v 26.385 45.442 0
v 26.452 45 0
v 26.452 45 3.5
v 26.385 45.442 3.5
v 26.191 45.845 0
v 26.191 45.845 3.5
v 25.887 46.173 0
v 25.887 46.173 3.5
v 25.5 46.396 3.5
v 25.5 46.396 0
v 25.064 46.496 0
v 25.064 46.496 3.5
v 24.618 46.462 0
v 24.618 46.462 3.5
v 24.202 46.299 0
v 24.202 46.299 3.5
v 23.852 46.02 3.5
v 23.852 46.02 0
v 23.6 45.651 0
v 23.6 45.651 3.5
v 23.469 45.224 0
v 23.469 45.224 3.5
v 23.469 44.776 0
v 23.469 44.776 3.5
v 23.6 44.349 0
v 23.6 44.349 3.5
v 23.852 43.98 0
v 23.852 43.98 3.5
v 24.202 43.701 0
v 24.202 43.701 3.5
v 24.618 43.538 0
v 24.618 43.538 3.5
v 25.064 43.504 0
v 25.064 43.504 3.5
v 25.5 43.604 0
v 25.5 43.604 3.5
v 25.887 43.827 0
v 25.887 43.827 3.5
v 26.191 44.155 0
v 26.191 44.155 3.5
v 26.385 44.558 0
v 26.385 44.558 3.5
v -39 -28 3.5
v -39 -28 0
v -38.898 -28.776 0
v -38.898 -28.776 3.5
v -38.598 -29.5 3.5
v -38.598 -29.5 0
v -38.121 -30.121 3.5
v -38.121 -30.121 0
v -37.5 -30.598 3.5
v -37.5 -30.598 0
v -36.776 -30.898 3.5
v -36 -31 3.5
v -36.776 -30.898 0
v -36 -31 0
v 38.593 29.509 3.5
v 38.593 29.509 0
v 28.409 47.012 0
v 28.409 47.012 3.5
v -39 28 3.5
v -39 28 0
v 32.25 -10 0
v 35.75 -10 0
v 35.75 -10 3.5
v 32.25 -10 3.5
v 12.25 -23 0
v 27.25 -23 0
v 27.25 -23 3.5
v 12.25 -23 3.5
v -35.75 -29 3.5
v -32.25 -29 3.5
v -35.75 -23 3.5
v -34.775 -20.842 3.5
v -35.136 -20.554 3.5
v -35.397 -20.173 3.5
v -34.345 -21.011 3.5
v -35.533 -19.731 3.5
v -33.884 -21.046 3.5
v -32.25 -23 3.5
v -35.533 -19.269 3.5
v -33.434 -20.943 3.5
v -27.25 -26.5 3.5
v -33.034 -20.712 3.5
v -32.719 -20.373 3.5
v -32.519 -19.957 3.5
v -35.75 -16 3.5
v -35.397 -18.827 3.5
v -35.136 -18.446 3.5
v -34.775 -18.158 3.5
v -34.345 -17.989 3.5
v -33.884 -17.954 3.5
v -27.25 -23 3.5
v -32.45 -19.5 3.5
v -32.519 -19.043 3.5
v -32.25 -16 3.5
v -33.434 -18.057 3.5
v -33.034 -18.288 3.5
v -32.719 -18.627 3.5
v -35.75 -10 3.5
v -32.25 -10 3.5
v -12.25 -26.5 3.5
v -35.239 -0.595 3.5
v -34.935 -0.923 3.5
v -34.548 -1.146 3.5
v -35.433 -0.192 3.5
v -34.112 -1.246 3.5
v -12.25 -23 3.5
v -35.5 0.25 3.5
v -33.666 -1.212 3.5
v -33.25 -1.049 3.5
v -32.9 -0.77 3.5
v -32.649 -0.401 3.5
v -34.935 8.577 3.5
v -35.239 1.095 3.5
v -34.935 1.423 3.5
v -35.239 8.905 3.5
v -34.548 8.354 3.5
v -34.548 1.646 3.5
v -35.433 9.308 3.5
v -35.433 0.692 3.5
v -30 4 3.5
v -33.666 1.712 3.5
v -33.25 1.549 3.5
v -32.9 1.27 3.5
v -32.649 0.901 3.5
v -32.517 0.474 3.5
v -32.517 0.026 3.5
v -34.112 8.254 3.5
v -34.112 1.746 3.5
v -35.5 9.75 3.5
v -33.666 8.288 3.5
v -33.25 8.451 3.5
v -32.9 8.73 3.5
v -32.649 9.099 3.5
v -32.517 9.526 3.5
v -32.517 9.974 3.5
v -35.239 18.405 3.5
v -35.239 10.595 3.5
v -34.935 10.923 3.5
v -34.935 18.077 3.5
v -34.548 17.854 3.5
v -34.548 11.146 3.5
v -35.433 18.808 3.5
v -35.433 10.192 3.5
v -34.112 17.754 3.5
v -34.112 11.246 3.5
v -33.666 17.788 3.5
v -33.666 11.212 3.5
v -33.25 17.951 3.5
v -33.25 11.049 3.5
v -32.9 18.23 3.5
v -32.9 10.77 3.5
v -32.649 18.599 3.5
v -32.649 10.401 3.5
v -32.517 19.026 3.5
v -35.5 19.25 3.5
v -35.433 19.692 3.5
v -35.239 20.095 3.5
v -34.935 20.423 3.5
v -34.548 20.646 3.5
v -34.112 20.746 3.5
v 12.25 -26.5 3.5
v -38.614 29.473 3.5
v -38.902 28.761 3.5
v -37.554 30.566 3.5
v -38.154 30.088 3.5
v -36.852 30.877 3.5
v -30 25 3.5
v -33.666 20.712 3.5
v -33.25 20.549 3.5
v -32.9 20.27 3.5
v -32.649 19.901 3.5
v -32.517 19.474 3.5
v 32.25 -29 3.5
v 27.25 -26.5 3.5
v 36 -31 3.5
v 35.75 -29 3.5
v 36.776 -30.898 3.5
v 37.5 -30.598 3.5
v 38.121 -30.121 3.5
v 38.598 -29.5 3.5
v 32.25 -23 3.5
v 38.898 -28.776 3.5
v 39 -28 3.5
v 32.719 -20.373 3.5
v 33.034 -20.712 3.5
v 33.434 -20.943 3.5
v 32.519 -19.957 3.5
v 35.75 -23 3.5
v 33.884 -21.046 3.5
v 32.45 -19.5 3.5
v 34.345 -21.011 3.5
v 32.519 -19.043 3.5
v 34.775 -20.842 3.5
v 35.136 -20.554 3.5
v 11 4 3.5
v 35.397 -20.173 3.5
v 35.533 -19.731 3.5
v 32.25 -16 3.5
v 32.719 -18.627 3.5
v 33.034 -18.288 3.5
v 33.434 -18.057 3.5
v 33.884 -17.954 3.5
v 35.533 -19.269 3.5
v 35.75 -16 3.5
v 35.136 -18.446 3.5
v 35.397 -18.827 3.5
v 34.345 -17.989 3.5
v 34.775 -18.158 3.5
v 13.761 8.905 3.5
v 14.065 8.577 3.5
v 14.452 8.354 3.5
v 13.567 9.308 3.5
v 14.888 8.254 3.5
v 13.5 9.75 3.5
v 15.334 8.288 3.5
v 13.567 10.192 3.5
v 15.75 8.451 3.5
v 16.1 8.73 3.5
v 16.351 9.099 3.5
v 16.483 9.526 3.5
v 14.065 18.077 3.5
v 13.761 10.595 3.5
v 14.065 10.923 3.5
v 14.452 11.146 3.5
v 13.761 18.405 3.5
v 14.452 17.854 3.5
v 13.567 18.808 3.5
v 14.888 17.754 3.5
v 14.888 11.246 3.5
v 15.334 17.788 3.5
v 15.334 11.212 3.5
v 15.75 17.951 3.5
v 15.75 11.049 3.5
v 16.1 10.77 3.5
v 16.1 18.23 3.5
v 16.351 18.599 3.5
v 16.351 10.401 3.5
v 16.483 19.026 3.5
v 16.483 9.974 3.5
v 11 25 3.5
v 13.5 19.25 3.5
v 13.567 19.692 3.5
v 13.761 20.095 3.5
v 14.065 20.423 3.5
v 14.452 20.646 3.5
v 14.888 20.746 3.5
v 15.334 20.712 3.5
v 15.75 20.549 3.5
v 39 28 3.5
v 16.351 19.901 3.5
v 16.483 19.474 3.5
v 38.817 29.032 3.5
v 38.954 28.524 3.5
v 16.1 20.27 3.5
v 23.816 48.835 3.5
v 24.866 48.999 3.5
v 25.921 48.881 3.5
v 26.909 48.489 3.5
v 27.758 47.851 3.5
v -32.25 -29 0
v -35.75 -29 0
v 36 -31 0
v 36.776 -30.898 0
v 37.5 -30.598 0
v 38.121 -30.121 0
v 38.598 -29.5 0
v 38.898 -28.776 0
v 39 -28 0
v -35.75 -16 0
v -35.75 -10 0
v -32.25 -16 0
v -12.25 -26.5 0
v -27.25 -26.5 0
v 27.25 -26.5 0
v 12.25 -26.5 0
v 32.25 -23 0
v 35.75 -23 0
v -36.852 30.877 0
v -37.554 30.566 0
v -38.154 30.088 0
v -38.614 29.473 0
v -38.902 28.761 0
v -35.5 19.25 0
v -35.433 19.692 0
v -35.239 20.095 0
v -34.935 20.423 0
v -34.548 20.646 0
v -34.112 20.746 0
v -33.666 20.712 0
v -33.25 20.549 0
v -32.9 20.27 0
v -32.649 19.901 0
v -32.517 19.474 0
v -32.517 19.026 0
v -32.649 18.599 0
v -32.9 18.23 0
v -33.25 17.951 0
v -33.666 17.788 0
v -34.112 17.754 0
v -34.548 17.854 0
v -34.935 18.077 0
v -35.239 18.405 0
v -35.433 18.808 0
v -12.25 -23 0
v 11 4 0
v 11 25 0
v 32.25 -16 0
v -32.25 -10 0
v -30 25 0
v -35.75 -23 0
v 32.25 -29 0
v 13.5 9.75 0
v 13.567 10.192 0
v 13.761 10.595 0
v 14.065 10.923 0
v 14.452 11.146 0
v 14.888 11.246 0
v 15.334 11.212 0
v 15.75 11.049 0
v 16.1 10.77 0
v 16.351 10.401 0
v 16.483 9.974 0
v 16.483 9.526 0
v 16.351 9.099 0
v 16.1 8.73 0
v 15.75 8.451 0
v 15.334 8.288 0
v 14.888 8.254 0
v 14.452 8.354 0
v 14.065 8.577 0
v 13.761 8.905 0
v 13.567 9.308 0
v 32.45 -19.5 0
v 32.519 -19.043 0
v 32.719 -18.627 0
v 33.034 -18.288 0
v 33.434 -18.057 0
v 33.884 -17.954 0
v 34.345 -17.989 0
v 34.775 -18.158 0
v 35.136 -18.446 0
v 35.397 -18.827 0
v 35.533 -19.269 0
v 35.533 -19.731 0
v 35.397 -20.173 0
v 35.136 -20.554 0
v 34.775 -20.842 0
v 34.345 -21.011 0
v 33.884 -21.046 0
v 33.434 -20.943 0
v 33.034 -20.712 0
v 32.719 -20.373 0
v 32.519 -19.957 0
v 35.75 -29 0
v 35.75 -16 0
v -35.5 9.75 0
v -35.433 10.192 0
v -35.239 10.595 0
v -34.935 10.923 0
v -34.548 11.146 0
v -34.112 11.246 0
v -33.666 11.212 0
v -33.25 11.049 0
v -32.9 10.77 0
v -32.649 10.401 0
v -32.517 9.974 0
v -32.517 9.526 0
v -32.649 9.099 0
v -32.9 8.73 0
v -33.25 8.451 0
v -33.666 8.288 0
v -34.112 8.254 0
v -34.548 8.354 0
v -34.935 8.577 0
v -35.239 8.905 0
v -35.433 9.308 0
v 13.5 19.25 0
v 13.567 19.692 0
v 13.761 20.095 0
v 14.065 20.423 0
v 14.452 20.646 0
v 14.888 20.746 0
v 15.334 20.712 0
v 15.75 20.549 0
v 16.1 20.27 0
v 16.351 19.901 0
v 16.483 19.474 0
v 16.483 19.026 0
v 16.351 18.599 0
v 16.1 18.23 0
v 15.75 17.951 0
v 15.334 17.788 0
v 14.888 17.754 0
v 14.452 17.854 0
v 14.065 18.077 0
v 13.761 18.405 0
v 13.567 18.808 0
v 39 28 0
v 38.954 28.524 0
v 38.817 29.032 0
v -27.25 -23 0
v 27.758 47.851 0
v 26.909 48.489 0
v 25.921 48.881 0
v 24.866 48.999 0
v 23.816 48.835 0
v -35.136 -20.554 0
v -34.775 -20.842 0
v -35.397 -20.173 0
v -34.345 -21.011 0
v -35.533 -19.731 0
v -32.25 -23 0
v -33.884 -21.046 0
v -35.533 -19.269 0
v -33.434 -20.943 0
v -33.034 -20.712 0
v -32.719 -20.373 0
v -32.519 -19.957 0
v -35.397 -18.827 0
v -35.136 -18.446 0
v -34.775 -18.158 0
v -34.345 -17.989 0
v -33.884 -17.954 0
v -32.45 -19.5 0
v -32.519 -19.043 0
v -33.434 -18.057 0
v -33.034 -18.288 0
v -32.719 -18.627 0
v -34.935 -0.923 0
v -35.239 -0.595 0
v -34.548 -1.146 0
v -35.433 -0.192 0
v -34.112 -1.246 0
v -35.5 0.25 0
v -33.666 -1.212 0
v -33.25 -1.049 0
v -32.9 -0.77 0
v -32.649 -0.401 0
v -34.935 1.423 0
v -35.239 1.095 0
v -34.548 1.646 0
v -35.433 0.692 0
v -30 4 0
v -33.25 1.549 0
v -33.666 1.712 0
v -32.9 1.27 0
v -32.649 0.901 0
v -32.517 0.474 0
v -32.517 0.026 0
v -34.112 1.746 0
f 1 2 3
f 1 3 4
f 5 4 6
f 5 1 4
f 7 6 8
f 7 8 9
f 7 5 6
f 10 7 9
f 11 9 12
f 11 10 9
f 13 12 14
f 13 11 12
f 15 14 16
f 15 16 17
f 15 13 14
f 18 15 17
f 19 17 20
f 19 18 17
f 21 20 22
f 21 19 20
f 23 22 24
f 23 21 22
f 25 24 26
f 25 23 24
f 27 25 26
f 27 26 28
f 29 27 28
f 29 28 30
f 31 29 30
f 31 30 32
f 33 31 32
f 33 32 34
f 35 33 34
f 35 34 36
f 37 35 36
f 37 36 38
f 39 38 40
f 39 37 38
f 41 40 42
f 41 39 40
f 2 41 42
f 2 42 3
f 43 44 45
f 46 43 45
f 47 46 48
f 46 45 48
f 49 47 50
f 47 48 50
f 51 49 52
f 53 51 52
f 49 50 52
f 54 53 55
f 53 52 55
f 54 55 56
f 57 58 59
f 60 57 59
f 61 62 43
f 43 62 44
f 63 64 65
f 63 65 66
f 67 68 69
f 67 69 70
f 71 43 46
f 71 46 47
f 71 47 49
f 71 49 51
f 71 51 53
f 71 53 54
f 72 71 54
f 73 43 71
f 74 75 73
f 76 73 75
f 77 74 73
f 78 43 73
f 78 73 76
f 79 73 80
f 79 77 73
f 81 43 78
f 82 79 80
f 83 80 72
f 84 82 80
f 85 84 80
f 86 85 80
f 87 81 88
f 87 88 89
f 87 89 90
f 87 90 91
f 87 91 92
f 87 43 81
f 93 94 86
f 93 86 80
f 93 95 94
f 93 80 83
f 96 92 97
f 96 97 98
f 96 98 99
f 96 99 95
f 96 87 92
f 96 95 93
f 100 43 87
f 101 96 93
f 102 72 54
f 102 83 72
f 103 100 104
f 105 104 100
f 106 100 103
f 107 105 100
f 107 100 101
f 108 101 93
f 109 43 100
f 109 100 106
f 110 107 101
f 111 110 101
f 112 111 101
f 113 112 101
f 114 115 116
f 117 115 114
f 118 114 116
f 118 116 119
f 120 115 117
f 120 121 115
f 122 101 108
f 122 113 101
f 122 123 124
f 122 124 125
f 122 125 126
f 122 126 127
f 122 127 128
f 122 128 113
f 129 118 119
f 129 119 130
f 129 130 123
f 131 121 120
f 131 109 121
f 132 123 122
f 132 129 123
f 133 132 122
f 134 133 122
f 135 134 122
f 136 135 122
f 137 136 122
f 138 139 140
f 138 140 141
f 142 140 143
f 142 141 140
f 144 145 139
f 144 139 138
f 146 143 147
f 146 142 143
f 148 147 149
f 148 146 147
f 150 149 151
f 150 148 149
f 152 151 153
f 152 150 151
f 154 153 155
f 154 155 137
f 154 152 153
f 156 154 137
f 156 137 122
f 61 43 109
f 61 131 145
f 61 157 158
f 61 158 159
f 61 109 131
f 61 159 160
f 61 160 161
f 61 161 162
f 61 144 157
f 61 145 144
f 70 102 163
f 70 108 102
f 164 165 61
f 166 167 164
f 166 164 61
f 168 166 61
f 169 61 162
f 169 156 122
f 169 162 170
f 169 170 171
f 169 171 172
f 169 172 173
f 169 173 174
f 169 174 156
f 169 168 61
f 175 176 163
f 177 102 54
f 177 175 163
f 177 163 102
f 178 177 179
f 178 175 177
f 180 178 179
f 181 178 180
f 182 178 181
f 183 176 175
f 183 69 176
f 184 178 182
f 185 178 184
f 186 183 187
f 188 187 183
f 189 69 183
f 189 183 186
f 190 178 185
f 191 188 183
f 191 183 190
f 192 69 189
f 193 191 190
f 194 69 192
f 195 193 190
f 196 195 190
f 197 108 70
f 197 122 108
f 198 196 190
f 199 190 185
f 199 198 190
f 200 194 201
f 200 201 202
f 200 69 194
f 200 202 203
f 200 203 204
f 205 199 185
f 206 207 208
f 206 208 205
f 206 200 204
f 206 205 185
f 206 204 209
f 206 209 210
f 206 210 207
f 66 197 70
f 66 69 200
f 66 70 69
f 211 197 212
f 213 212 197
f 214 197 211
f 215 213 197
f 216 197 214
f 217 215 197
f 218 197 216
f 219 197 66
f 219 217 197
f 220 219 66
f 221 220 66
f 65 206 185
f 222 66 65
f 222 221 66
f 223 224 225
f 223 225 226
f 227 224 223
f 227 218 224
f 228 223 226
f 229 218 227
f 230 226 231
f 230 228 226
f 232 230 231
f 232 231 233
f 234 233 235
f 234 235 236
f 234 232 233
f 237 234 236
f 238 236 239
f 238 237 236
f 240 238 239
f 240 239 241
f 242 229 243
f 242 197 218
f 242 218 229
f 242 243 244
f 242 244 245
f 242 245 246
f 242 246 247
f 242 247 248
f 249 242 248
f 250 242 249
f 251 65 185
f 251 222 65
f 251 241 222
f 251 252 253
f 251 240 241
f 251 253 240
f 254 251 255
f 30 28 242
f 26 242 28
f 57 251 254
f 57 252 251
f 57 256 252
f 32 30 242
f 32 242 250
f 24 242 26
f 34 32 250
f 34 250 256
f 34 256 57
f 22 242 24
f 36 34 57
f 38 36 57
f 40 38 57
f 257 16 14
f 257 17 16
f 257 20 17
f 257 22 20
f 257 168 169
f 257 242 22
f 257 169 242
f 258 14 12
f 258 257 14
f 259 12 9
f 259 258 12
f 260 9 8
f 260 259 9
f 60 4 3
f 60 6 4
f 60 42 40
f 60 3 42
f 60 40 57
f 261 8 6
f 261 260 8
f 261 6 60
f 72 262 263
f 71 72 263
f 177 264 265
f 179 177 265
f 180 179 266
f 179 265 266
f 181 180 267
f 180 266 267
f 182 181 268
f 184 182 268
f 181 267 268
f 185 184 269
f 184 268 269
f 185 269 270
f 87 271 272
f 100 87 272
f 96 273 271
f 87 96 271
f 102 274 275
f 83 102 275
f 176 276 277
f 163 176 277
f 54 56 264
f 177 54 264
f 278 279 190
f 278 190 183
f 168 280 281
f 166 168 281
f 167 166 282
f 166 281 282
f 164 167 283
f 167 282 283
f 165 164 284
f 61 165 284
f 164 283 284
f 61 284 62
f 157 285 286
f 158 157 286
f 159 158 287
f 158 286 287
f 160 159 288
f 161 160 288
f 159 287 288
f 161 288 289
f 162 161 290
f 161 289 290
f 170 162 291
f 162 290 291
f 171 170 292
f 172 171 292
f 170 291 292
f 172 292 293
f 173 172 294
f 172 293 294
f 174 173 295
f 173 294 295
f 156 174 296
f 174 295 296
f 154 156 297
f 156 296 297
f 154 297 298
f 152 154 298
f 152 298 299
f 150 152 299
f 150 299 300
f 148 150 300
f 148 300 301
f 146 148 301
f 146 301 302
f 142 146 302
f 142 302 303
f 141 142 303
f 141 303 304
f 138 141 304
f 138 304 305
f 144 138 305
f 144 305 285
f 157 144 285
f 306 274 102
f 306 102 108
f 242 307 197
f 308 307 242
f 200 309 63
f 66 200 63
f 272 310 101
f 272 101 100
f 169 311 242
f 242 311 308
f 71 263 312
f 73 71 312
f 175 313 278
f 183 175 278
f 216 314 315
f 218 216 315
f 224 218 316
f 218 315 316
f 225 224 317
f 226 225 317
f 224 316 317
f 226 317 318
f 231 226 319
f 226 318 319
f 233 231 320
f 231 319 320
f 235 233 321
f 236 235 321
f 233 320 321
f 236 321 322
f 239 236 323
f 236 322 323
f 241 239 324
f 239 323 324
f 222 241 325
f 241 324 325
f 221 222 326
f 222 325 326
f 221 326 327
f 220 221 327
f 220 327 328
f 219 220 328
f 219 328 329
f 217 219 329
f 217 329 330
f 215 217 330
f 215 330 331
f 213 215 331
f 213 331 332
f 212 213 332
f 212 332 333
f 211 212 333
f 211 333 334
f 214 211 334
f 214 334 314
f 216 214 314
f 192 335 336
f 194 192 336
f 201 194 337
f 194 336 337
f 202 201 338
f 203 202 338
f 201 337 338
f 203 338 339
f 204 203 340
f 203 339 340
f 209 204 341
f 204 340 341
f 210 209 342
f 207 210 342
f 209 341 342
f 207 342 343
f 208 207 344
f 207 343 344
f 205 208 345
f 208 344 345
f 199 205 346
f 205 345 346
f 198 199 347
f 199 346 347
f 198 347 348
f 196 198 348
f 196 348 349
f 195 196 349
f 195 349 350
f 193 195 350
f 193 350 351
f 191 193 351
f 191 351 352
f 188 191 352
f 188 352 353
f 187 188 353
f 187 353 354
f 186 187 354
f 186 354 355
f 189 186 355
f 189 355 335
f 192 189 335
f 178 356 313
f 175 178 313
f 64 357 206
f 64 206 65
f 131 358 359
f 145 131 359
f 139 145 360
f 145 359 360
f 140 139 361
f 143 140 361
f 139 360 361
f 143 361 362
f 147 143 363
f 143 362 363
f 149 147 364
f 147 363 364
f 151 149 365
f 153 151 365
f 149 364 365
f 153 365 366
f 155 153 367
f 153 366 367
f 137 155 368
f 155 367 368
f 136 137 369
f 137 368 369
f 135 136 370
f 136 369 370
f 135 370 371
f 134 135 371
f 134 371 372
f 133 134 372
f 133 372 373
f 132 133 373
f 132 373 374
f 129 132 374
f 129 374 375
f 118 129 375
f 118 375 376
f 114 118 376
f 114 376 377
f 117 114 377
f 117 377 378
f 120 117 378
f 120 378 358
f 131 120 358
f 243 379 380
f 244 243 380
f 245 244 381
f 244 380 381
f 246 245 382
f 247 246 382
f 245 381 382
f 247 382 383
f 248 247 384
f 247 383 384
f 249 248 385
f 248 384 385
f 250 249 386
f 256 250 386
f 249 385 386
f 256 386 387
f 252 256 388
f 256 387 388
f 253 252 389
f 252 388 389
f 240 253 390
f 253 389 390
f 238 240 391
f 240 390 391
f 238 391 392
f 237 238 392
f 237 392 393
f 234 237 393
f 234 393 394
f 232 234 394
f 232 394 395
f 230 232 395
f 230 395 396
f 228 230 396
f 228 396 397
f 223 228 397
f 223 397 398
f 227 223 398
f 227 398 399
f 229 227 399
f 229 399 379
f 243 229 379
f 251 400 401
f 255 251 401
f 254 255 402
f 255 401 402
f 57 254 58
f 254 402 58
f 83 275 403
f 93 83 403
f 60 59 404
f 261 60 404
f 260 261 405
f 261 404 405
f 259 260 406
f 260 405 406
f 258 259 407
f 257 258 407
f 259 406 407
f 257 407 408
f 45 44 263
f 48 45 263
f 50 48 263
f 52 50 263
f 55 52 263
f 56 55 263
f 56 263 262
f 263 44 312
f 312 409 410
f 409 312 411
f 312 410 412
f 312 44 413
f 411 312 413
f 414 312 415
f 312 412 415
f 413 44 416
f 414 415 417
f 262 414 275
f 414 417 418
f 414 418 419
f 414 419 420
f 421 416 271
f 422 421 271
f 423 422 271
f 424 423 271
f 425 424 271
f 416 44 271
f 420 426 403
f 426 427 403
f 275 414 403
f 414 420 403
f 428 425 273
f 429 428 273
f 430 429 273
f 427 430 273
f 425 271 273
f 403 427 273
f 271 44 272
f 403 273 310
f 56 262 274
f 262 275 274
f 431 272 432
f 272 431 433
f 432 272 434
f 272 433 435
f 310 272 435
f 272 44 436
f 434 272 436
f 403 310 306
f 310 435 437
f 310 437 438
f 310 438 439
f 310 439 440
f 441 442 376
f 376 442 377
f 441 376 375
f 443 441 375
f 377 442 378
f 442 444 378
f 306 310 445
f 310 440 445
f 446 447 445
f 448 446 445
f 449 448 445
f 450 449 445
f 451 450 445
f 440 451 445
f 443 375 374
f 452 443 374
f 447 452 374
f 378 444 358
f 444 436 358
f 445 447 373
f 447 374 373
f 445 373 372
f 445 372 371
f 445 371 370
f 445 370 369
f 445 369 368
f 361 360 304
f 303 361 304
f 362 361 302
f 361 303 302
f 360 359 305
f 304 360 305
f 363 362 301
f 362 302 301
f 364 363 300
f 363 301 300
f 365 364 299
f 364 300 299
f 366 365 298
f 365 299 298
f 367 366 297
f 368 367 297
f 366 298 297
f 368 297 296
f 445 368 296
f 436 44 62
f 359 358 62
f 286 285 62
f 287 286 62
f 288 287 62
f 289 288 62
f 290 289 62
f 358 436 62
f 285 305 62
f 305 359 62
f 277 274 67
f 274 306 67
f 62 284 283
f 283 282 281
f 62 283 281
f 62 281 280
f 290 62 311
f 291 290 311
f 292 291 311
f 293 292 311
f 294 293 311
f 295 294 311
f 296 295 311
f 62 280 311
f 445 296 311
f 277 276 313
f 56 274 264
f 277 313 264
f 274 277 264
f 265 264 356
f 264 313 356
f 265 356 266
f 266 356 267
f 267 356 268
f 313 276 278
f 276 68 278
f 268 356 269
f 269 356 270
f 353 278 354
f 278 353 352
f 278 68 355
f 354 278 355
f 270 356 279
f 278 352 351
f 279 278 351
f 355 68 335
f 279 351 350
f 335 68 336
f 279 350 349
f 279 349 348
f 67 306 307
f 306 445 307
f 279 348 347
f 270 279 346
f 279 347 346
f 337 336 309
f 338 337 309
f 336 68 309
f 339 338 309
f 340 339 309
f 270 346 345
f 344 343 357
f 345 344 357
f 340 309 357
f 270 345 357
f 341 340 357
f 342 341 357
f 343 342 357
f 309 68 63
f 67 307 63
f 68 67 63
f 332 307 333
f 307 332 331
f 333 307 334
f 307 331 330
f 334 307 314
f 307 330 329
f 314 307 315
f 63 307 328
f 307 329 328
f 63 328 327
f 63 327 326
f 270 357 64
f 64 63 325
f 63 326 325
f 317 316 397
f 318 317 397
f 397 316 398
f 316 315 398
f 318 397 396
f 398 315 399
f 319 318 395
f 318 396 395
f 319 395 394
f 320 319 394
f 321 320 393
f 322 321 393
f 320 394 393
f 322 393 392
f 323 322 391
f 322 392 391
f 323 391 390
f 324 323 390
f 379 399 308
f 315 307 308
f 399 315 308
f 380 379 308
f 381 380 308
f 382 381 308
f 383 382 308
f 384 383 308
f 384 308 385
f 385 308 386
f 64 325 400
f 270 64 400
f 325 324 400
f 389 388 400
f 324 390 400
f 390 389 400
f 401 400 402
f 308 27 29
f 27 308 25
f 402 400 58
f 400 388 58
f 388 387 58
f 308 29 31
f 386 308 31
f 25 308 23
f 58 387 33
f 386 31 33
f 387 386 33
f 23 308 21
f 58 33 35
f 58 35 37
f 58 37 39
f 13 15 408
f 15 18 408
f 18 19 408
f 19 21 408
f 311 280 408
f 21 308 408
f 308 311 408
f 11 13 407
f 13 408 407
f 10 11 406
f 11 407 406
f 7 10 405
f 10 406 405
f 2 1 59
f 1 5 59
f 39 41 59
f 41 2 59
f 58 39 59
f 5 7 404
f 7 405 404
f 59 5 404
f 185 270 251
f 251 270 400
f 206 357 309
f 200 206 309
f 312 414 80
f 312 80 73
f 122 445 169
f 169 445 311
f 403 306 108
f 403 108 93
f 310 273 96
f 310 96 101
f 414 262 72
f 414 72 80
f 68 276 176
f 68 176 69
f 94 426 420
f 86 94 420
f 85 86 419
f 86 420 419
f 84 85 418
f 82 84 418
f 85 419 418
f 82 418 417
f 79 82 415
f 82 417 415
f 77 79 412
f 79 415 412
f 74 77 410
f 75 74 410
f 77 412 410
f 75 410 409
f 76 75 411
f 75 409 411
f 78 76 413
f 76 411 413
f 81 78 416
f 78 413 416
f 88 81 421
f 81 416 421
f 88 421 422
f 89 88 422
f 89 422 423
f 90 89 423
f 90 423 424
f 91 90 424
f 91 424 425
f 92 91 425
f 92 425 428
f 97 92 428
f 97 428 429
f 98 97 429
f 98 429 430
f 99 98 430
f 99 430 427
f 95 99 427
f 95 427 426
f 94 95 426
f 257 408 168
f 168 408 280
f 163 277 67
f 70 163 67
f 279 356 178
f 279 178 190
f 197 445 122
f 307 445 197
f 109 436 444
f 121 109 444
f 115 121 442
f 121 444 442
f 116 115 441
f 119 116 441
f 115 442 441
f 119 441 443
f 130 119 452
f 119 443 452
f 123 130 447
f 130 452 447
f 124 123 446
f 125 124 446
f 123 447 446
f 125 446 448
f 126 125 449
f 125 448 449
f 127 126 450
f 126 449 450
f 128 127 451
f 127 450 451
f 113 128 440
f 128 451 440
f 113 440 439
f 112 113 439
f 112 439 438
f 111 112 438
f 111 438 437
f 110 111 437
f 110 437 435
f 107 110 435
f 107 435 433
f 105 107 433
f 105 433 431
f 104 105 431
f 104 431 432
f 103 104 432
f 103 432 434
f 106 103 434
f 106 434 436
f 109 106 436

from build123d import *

# Parameters (mm, degrees)
SKETCH1_R           = 1.5
SKETCH1_W           = 41
SKETCH1_H           = 21
BOSS_EXTRUDE1_DEPTH = 3.5
SKETCH2_R           = 1.55
SKETCH2_W           = 3.5
SKETCH2_H           = 6
CUT_EXTRUDE1_DEPTH  = 63.723600024
SKETCH3_W           = 15
SKETCH3_H           = 3.5
CUT_EXTRUDE2_DEPTH  = 63.723600024
SKETCH4_R           = 1.5
CUT_EXTRUDE3_DEPTH  = 63.723600024
CUT_EXTRUDE5_REACH  = 64.724
SKETCH5_R           = 1.5


with BuildPart() as part:
    # Sketch1 → Boss-Extrude1 (new body)
    with BuildSketch(Plane.XY):
        with BuildLine():
            Line((-36, -31), (36, -31))
            ThreePointArc((36, -31), (38.121320344, -30.121320344), (39, -28))
            Line((39, -28), (39, 28))
            ThreePointArc((39, 28), (38.896468429, 28.781326206), (38.593019574, 29.508724458))
            Line((38.593019574, 29.508724458), (28.409114334, 47.011632611))
            ThreePointArc((28.409114334, 47.011632611), (26.428070455, 48.717592284), (23.81637841, 48.835481746))
            Line((23.81637841, 48.835481746), (-36.851532369, 30.876611309))
            ThreePointArc((-36.851532369, 30.876611309), (-38.403601164, 29.795188415), (-39, 28))
            Line((-39, 28), (-39, -28))
            ThreePointArc((-39, -28), (-38.121320344, -30.121320344), (-36, -31))
        make_face()
        with Locations((24.951754903, 45)):
            Circle(SKETCH1_R, mode=Mode.SUBTRACT)
        with Locations((-9.5, 14.5)):
            Rectangle(SKETCH1_W, SKETCH1_H, mode=Mode.SUBTRACT)
    extrude(amount=BOSS_EXTRUDE1_DEPTH)

    # Sketch2 → Cut-Extrude1 (cut, through all)
    with BuildSketch(Plane(origin=(0, 0, 0), x_dir=(-1, 0, 0), z_dir=(0, 0, -1))):
        with Locations((-34, -19.5)):
            Circle(SKETCH2_R)
        with Locations(Location((34, -19.5, 0), (0, 0, 180))):
            Circle(SKETCH2_R)
        with Locations((-34, -13)):
            Rectangle(SKETCH2_W, SKETCH2_H)
        with Locations((-34, -26)):
            Rectangle(SKETCH2_W, SKETCH2_H)
        with Locations((34, -26)):
            Rectangle(SKETCH2_W, SKETCH2_H)
        with Locations((34, -13)):
            Rectangle(SKETCH2_W, SKETCH2_H)
    extrude(amount=-CUT_EXTRUDE1_DEPTH, mode=Mode.SUBTRACT)

    # Sketch3 → Cut-Extrude2 (cut, through all)
    with BuildSketch(Plane(origin=(0, 0, 0), x_dir=(-1, 0, 0), z_dir=(0, 0, -1))):
        with Locations((19.75, -24.75)):
            Rectangle(SKETCH3_W, SKETCH3_H)
        with Locations((-19.75, -24.75)):
            Rectangle(SKETCH3_W, SKETCH3_H)
    extrude(amount=-CUT_EXTRUDE2_DEPTH, mode=Mode.SUBTRACT)

    # Sketch4 → Cut-Extrude3 (cut, through all)
    with BuildSketch(Plane(origin=(0, 0, 0), x_dir=(-1, 0, 0), z_dir=(0, 0, -1))):
        with Locations((-15, 19.25)):
            Circle(SKETCH4_R)
        with Locations((-15, 9.75)):
            Circle(SKETCH4_R)
        with Locations((34, 9.75)):
            Circle(SKETCH4_R)
        with Locations((34, 19.25)):
            Circle(SKETCH4_R)
    extrude(amount=-CUT_EXTRUDE3_DEPTH, mode=Mode.SUBTRACT)

    # Sketch5 → Cut-Extrude5 (cut, up to next)
    with BuildSketch(Plane(origin=(0, 0, 0), x_dir=(-1, 0, 0), z_dir=(0, 0, -1)), mode=Mode.PRIVATE) as cut_extrude5_sk1:
        with Locations((34, 0.25)):
            Circle(SKETCH5_R)
    cut_extrude5_tool1 = extrude(cut_extrude5_sk1.sketch, amount=-CUT_EXTRUDE5_REACH, mode=Mode.PRIVATE) & part.part
    add(cut_extrude5_tool1.solids().sort_by_distance((-34, 0.25, 0))[0], mode=Mode.SUBTRACT)


solid = part.part
